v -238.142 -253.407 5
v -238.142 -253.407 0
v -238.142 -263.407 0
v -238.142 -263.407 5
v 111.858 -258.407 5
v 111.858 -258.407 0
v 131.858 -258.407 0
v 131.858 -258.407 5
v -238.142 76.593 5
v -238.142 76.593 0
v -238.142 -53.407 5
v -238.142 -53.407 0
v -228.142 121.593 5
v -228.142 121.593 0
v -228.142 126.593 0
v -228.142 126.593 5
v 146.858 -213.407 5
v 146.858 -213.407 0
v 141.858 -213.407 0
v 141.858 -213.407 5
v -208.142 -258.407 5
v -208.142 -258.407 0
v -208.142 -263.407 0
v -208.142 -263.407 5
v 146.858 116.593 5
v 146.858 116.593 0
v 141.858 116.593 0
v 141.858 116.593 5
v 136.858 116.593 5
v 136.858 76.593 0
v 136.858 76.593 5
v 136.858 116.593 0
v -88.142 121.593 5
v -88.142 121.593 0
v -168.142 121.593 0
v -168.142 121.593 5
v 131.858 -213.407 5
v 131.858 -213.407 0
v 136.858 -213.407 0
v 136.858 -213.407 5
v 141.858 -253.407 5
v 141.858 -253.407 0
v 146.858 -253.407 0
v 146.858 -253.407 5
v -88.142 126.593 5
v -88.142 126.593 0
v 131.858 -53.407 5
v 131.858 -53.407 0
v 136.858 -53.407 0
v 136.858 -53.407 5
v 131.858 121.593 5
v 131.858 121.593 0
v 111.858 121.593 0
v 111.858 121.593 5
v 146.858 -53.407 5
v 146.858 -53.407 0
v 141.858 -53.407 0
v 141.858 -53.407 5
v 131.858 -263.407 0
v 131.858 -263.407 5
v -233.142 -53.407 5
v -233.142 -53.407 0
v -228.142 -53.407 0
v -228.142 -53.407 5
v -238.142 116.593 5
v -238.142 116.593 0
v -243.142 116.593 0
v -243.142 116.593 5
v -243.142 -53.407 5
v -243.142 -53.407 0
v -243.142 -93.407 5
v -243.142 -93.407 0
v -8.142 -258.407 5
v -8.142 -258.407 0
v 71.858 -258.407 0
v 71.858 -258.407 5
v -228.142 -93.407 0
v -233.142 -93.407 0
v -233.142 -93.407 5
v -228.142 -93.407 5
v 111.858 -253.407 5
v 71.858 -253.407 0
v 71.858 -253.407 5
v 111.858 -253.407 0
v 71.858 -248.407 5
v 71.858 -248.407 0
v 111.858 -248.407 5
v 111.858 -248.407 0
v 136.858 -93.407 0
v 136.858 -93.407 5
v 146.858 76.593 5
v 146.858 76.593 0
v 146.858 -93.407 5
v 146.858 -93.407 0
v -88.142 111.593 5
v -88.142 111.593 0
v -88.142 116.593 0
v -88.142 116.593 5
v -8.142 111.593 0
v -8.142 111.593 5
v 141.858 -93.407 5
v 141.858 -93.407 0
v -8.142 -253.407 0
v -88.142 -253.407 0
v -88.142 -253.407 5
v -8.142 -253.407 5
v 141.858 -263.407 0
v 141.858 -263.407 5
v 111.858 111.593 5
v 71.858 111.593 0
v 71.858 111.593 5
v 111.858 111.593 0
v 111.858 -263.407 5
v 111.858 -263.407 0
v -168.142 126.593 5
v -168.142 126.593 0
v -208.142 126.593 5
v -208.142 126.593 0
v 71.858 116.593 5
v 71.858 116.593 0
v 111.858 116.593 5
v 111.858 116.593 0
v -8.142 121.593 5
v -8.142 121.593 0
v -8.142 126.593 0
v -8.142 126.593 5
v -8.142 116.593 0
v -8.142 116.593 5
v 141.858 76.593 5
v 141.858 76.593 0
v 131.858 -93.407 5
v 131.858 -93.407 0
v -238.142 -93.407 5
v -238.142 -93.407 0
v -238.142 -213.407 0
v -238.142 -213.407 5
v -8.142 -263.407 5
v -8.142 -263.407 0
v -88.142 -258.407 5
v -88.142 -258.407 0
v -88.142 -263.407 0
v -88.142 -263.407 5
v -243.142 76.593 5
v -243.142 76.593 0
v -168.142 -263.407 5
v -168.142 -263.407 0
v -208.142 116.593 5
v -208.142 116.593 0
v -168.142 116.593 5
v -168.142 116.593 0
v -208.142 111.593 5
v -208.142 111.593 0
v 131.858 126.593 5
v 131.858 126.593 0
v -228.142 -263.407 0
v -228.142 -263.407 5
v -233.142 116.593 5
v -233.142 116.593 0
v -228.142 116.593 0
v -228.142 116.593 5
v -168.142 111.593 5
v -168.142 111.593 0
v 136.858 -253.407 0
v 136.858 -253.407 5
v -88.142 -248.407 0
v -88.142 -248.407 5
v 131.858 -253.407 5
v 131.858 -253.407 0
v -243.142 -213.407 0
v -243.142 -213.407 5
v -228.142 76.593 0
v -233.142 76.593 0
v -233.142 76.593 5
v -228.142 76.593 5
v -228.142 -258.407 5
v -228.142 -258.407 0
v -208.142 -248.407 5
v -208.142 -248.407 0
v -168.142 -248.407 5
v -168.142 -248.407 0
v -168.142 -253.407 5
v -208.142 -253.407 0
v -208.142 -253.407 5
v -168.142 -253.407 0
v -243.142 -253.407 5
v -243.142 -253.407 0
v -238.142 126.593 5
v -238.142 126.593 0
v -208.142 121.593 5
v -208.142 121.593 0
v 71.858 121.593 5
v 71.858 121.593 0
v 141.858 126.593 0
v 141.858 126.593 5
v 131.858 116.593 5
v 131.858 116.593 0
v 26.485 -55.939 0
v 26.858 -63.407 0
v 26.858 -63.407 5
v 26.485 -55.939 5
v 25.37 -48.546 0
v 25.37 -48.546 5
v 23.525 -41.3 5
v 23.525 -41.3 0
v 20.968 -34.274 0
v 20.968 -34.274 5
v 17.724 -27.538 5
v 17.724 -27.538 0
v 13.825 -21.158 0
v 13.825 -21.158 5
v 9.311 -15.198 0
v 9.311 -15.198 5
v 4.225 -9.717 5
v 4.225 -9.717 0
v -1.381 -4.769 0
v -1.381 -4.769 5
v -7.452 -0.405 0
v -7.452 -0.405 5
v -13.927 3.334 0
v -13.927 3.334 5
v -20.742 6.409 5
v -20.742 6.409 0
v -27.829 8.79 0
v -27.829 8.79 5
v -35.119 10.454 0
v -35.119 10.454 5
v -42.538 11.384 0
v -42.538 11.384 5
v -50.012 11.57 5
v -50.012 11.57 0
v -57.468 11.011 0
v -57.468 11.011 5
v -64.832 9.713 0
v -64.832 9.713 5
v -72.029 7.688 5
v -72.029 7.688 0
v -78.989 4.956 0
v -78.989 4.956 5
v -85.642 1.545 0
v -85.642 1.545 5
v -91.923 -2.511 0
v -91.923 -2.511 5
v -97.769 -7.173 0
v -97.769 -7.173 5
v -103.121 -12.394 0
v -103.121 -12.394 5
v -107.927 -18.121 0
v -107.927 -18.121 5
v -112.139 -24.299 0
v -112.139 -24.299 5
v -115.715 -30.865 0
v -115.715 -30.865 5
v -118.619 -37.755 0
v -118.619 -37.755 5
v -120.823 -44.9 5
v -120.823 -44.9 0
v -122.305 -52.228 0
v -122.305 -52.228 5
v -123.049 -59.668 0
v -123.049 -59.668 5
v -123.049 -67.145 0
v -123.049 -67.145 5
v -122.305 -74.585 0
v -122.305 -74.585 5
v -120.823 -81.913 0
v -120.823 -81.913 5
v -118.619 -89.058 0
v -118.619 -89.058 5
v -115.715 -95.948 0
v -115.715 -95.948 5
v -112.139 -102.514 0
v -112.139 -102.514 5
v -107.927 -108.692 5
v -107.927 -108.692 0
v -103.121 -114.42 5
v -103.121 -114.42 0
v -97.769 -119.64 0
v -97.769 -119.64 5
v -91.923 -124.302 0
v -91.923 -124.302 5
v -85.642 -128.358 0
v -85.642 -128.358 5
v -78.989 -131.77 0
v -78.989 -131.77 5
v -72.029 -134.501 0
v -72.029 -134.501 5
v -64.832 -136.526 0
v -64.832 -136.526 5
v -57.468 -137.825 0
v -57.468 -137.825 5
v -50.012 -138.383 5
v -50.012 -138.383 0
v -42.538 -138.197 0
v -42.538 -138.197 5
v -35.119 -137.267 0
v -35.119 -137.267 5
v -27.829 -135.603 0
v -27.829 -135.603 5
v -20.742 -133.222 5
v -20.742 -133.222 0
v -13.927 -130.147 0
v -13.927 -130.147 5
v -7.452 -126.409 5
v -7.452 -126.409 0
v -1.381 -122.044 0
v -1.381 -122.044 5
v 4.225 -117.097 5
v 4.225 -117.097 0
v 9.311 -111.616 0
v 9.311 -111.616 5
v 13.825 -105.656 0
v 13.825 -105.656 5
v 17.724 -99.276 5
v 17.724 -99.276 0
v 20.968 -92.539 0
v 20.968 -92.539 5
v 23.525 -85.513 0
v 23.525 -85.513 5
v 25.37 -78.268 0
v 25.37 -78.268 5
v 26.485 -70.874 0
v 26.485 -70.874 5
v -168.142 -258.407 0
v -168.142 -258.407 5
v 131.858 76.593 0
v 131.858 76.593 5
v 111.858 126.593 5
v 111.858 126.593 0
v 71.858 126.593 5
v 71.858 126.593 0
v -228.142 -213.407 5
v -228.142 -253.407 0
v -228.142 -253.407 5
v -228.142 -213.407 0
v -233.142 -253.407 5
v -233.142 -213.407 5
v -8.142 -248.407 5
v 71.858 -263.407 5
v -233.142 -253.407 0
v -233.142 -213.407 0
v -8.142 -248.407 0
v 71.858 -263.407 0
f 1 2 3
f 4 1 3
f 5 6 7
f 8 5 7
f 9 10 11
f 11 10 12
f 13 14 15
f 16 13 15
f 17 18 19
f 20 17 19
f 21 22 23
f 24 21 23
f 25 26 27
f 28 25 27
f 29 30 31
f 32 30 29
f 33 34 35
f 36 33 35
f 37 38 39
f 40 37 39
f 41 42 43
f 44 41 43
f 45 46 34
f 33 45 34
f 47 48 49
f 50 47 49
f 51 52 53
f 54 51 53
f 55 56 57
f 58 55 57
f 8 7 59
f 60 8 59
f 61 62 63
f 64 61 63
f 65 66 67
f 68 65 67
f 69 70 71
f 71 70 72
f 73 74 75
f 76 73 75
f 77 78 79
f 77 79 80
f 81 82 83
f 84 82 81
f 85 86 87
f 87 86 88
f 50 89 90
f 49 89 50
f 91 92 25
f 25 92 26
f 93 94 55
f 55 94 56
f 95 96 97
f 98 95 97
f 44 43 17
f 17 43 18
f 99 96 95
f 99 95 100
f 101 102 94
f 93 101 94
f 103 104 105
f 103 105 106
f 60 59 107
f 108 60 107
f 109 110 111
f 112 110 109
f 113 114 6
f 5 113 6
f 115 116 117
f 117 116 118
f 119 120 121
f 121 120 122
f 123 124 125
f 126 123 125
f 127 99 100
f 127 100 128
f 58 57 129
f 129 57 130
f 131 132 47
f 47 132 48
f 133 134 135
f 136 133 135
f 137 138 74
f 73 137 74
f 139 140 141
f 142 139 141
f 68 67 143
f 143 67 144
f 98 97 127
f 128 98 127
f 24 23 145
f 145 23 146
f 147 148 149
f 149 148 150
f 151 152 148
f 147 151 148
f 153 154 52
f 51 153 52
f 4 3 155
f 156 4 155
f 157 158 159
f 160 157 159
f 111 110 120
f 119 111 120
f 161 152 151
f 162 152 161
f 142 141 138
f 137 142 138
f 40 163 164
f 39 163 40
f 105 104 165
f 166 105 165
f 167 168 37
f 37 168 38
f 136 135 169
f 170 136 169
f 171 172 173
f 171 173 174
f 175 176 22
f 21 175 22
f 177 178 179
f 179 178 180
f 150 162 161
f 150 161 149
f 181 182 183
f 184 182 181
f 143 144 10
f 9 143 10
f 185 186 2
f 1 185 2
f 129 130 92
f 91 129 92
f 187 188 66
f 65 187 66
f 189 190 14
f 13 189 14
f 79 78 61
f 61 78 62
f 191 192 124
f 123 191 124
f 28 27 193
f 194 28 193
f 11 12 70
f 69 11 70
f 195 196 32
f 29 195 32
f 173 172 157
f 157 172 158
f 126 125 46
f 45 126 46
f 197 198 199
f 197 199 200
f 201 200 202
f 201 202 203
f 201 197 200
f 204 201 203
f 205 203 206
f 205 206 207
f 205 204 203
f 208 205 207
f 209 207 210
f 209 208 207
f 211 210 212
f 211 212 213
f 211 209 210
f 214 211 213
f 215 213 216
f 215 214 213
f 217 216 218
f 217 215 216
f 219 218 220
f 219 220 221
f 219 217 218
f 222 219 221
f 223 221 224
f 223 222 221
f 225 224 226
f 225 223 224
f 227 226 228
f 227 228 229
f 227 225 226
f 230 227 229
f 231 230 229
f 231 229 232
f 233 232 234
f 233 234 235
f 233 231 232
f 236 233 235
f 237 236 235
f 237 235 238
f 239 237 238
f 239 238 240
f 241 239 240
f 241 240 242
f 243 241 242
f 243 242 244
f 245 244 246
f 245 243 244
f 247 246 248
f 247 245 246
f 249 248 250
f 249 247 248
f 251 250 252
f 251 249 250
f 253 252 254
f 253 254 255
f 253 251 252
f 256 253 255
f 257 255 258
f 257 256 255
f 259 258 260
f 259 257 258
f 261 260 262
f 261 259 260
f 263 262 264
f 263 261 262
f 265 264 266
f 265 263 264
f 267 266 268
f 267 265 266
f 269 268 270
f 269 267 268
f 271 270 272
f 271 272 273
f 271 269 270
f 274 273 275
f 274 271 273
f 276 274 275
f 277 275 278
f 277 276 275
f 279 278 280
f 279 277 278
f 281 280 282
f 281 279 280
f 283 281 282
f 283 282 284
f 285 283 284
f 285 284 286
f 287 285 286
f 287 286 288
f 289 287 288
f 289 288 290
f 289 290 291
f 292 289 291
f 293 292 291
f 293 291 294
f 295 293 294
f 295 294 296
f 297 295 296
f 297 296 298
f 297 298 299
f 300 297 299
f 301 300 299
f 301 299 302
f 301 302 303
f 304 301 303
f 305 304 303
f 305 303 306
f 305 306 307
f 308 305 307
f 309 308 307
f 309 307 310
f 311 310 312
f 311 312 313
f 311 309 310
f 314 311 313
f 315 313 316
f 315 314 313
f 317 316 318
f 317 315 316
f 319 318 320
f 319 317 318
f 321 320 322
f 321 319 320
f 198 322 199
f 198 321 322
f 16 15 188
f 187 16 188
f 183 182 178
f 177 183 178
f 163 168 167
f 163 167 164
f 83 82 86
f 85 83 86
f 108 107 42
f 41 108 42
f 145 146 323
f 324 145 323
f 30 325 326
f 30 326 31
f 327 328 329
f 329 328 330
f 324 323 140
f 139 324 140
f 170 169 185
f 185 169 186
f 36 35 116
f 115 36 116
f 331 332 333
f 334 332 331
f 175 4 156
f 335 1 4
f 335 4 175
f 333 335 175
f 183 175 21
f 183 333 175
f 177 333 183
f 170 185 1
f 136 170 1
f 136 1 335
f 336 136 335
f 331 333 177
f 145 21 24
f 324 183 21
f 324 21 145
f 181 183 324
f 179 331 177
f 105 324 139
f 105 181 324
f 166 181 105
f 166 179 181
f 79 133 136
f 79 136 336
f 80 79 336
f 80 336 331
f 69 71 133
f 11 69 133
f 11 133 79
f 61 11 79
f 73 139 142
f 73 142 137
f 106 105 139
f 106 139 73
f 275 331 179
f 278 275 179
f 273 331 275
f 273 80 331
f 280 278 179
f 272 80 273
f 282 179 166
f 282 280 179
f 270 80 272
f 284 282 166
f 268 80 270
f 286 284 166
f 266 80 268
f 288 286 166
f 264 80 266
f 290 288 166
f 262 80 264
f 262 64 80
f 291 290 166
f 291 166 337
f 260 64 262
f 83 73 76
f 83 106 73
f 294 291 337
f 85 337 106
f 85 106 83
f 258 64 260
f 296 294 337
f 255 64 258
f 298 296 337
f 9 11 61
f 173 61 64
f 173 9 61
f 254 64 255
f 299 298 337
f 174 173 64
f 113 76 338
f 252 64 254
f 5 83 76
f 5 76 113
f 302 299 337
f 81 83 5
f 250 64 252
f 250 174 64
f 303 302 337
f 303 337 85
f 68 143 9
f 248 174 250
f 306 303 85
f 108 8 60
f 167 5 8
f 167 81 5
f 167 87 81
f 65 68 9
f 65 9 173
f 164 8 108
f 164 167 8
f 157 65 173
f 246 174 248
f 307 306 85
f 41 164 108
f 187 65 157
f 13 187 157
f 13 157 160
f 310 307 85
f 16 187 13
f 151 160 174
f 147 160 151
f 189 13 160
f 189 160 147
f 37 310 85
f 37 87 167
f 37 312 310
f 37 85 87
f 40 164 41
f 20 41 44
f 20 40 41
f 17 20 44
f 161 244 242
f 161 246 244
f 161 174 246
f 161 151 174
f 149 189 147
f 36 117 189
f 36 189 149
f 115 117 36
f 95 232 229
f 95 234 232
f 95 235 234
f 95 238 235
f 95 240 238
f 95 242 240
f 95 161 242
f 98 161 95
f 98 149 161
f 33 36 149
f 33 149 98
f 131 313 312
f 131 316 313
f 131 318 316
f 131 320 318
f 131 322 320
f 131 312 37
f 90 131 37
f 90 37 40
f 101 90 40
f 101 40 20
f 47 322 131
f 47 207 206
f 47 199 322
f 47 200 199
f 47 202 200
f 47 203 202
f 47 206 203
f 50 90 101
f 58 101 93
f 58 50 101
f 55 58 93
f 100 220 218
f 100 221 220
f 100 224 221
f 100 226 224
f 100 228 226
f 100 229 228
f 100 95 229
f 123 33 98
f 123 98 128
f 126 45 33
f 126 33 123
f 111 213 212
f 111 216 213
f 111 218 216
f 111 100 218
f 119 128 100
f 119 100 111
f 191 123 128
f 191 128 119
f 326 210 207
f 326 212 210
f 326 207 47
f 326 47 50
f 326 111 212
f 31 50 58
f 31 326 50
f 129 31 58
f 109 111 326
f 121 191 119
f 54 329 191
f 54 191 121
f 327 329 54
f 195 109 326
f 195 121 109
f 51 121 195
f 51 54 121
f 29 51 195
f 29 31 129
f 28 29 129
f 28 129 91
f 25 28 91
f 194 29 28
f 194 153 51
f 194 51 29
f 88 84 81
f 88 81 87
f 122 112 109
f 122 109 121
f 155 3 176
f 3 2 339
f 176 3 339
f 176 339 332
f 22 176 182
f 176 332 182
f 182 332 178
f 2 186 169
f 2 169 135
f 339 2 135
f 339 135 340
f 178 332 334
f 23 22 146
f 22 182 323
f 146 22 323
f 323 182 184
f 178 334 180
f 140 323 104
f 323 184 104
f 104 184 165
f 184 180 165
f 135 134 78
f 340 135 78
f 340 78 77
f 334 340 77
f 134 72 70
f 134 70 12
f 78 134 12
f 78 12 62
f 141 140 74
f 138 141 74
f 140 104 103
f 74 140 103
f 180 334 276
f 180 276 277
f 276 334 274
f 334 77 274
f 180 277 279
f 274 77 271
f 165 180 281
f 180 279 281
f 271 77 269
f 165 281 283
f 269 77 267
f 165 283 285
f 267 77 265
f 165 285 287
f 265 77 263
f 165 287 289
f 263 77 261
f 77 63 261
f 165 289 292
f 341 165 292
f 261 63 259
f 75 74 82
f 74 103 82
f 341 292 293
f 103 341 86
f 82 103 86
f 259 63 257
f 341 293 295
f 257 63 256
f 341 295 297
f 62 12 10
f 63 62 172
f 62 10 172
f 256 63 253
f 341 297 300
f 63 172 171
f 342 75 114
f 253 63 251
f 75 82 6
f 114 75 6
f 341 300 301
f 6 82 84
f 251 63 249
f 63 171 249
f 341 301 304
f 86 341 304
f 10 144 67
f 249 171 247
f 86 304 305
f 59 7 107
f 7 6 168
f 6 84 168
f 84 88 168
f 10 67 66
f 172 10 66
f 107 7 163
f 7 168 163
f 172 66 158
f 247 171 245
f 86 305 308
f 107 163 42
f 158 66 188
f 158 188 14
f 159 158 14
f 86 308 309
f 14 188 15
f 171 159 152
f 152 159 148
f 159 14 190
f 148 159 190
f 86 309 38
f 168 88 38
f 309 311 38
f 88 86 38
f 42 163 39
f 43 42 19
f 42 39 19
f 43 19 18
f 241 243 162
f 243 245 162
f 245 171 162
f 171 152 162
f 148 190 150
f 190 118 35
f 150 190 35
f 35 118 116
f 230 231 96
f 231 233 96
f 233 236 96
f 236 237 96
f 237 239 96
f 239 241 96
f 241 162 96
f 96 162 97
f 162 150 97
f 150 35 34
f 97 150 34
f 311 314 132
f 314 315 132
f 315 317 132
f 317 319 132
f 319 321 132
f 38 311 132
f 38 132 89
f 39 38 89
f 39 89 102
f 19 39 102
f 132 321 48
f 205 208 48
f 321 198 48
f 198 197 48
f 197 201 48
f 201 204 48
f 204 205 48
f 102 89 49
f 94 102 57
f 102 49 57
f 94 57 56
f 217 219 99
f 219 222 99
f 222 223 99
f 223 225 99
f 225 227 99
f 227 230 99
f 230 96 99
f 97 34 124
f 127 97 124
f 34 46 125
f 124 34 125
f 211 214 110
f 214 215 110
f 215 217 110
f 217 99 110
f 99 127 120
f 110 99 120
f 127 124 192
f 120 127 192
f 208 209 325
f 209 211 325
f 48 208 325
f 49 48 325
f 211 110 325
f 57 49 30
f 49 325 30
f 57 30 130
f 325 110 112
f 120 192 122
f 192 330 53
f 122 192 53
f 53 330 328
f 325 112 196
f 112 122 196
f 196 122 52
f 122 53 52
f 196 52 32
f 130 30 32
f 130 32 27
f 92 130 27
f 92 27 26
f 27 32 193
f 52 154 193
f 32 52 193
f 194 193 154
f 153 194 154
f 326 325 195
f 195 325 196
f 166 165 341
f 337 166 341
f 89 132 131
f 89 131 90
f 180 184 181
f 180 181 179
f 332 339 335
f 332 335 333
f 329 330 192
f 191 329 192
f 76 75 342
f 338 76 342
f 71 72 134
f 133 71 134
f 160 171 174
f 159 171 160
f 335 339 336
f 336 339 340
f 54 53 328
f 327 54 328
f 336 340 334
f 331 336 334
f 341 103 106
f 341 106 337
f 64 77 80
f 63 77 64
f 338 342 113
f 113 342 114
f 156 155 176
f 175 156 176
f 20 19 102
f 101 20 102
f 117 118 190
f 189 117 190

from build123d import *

# Parameters (mm, degrees)
ESQUISSE1_W        = 5
ESQUISSE1_H        = 40
ESQUISSE1_W_2      = 40
ESQUISSE1_H_2      = 5
ESQUISSE1_W_3      = 80
ESQUISSE1_R        = 75
BOSS_EXTRU_1_DEPTH = 5


with BuildPart() as part:
    # Esquisse1 → Boss.-Extru.1 (new body)
    with BuildSketch(Plane.XY):
        Polygon((-238.142492866, -253.406593407), (-238.142492866, -263.406593407), (-228.142492866, -263.406593407), (-228.142492866, -258.406593407), (-208.142492866, -258.406593407), (-208.142492866, -263.406593407), (-168.142492866, -263.406593407), (-168.142492866, -258.406593407), (-88.142492866, -258.406593407), (-88.142492866, -263.406593407), (-8.142492866, -263.406593407), (-8.142492866, -258.406593407), (71.857507134, -258.406593407), (71.857507134, -263.406593407), (111.857507134, -263.406593407), (111.857507134, -258.406593407), (131.857507134, -258.406593407), (131.857507134, -263.406593407), (141.857507134, -263.406593407), (141.857507134, -253.406593407), (146.857507134, -253.406593407), (146.857507134, -213.406593407), (141.857507134, -213.406593407), (141.857507134, -93.406593407), (146.857507134, -93.406593407), (146.857507134, -53.406593407), (141.857507134, -53.406593407), (141.857507134, 76.593406593), (146.857507134, 76.593406593), (146.857507134, 116.593406593), (141.857507134, 116.593406593), (141.857507134, 126.593406593), (131.857507134, 126.593406593), (131.857507134, 121.593406593), (111.857507134, 121.593406593), (111.857507134, 126.593406593), (71.857507134, 126.593406593), (71.857507134, 121.593406593), (-8.142492866, 121.593406593), (-8.142492866, 126.593406593), (-88.142492866, 126.593406593), (-88.142492866, 121.593406593), (-168.142492866, 121.593406593), (-168.142492866, 126.593406593), (-208.142492866, 126.593406593), (-208.142492866, 121.593406593), (-228.142492866, 121.593406593), (-228.142492866, 126.593406593), (-238.142492866, 126.593406593), (-238.142492866, 116.593406593), (-243.142492866, 116.593406593), (-243.142492866, 76.593406593), (-238.142492866, 76.593406593), (-238.142492866, -53.406593407), (-243.142492866, -53.406593407), (-243.142492866, -93.406593407), (-238.142492866, -93.406593407), (-238.142492866, -213.406593407), (-243.142492866, -213.406593407), (-243.142492866, -253.406593407), align=None)
        with Locations((134.357507134, -233.406593407)):
            Rectangle(ESQUISSE1_W, ESQUISSE1_H, mode=Mode.SUBTRACT)
        with Locations((134.357507134, -73.406593407)):
            Rectangle(ESQUISSE1_W, ESQUISSE1_H, mode=Mode.SUBTRACT)
        with Locations((134.357507134, 96.593406593)):
            Rectangle(ESQUISSE1_W, ESQUISSE1_H, mode=Mode.SUBTRACT)
        with Locations((91.857507134, 114.093406593)):
            Rectangle(ESQUISSE1_W_2, ESQUISSE1_H_2, mode=Mode.SUBTRACT)
        with Locations((-48.142492866, 114.093406593)):
            Rectangle(ESQUISSE1_W_3, ESQUISSE1_H_2, mode=Mode.SUBTRACT)
        with Locations((-188.142492866, 114.093406593)):
            Rectangle(ESQUISSE1_W_2, ESQUISSE1_H_2, mode=Mode.SUBTRACT)
        with Locations((-230.642492866, 96.593406593)):
            Rectangle(ESQUISSE1_W, ESQUISSE1_H, mode=Mode.SUBTRACT)
        with Locations((-230.642492866, -73.406593407)):
            Rectangle(ESQUISSE1_W, ESQUISSE1_H, mode=Mode.SUBTRACT)
        with Locations((-230.642492866, -233.406593407)):
            Rectangle(ESQUISSE1_W, ESQUISSE1_H, mode=Mode.SUBTRACT)
        with Locations((-188.142492866, -250.906593407)):
            Rectangle(ESQUISSE1_W_2, ESQUISSE1_H_2, mode=Mode.SUBTRACT)
        with Locations((-48.142492866, -250.906593407)):
            Rectangle(ESQUISSE1_W_3, ESQUISSE1_H_2, mode=Mode.SUBTRACT)
        with Locations((91.857507134, -250.906593407)):
            Rectangle(ESQUISSE1_W_2, ESQUISSE1_H_2, mode=Mode.SUBTRACT)
        with Locations((-48.142492866, -63.406593407)):
            Circle(ESQUISSE1_R, mode=Mode.SUBTRACT)
    extrude(amount=BOSS_EXTRU_1_DEPTH)


solid = part.part
